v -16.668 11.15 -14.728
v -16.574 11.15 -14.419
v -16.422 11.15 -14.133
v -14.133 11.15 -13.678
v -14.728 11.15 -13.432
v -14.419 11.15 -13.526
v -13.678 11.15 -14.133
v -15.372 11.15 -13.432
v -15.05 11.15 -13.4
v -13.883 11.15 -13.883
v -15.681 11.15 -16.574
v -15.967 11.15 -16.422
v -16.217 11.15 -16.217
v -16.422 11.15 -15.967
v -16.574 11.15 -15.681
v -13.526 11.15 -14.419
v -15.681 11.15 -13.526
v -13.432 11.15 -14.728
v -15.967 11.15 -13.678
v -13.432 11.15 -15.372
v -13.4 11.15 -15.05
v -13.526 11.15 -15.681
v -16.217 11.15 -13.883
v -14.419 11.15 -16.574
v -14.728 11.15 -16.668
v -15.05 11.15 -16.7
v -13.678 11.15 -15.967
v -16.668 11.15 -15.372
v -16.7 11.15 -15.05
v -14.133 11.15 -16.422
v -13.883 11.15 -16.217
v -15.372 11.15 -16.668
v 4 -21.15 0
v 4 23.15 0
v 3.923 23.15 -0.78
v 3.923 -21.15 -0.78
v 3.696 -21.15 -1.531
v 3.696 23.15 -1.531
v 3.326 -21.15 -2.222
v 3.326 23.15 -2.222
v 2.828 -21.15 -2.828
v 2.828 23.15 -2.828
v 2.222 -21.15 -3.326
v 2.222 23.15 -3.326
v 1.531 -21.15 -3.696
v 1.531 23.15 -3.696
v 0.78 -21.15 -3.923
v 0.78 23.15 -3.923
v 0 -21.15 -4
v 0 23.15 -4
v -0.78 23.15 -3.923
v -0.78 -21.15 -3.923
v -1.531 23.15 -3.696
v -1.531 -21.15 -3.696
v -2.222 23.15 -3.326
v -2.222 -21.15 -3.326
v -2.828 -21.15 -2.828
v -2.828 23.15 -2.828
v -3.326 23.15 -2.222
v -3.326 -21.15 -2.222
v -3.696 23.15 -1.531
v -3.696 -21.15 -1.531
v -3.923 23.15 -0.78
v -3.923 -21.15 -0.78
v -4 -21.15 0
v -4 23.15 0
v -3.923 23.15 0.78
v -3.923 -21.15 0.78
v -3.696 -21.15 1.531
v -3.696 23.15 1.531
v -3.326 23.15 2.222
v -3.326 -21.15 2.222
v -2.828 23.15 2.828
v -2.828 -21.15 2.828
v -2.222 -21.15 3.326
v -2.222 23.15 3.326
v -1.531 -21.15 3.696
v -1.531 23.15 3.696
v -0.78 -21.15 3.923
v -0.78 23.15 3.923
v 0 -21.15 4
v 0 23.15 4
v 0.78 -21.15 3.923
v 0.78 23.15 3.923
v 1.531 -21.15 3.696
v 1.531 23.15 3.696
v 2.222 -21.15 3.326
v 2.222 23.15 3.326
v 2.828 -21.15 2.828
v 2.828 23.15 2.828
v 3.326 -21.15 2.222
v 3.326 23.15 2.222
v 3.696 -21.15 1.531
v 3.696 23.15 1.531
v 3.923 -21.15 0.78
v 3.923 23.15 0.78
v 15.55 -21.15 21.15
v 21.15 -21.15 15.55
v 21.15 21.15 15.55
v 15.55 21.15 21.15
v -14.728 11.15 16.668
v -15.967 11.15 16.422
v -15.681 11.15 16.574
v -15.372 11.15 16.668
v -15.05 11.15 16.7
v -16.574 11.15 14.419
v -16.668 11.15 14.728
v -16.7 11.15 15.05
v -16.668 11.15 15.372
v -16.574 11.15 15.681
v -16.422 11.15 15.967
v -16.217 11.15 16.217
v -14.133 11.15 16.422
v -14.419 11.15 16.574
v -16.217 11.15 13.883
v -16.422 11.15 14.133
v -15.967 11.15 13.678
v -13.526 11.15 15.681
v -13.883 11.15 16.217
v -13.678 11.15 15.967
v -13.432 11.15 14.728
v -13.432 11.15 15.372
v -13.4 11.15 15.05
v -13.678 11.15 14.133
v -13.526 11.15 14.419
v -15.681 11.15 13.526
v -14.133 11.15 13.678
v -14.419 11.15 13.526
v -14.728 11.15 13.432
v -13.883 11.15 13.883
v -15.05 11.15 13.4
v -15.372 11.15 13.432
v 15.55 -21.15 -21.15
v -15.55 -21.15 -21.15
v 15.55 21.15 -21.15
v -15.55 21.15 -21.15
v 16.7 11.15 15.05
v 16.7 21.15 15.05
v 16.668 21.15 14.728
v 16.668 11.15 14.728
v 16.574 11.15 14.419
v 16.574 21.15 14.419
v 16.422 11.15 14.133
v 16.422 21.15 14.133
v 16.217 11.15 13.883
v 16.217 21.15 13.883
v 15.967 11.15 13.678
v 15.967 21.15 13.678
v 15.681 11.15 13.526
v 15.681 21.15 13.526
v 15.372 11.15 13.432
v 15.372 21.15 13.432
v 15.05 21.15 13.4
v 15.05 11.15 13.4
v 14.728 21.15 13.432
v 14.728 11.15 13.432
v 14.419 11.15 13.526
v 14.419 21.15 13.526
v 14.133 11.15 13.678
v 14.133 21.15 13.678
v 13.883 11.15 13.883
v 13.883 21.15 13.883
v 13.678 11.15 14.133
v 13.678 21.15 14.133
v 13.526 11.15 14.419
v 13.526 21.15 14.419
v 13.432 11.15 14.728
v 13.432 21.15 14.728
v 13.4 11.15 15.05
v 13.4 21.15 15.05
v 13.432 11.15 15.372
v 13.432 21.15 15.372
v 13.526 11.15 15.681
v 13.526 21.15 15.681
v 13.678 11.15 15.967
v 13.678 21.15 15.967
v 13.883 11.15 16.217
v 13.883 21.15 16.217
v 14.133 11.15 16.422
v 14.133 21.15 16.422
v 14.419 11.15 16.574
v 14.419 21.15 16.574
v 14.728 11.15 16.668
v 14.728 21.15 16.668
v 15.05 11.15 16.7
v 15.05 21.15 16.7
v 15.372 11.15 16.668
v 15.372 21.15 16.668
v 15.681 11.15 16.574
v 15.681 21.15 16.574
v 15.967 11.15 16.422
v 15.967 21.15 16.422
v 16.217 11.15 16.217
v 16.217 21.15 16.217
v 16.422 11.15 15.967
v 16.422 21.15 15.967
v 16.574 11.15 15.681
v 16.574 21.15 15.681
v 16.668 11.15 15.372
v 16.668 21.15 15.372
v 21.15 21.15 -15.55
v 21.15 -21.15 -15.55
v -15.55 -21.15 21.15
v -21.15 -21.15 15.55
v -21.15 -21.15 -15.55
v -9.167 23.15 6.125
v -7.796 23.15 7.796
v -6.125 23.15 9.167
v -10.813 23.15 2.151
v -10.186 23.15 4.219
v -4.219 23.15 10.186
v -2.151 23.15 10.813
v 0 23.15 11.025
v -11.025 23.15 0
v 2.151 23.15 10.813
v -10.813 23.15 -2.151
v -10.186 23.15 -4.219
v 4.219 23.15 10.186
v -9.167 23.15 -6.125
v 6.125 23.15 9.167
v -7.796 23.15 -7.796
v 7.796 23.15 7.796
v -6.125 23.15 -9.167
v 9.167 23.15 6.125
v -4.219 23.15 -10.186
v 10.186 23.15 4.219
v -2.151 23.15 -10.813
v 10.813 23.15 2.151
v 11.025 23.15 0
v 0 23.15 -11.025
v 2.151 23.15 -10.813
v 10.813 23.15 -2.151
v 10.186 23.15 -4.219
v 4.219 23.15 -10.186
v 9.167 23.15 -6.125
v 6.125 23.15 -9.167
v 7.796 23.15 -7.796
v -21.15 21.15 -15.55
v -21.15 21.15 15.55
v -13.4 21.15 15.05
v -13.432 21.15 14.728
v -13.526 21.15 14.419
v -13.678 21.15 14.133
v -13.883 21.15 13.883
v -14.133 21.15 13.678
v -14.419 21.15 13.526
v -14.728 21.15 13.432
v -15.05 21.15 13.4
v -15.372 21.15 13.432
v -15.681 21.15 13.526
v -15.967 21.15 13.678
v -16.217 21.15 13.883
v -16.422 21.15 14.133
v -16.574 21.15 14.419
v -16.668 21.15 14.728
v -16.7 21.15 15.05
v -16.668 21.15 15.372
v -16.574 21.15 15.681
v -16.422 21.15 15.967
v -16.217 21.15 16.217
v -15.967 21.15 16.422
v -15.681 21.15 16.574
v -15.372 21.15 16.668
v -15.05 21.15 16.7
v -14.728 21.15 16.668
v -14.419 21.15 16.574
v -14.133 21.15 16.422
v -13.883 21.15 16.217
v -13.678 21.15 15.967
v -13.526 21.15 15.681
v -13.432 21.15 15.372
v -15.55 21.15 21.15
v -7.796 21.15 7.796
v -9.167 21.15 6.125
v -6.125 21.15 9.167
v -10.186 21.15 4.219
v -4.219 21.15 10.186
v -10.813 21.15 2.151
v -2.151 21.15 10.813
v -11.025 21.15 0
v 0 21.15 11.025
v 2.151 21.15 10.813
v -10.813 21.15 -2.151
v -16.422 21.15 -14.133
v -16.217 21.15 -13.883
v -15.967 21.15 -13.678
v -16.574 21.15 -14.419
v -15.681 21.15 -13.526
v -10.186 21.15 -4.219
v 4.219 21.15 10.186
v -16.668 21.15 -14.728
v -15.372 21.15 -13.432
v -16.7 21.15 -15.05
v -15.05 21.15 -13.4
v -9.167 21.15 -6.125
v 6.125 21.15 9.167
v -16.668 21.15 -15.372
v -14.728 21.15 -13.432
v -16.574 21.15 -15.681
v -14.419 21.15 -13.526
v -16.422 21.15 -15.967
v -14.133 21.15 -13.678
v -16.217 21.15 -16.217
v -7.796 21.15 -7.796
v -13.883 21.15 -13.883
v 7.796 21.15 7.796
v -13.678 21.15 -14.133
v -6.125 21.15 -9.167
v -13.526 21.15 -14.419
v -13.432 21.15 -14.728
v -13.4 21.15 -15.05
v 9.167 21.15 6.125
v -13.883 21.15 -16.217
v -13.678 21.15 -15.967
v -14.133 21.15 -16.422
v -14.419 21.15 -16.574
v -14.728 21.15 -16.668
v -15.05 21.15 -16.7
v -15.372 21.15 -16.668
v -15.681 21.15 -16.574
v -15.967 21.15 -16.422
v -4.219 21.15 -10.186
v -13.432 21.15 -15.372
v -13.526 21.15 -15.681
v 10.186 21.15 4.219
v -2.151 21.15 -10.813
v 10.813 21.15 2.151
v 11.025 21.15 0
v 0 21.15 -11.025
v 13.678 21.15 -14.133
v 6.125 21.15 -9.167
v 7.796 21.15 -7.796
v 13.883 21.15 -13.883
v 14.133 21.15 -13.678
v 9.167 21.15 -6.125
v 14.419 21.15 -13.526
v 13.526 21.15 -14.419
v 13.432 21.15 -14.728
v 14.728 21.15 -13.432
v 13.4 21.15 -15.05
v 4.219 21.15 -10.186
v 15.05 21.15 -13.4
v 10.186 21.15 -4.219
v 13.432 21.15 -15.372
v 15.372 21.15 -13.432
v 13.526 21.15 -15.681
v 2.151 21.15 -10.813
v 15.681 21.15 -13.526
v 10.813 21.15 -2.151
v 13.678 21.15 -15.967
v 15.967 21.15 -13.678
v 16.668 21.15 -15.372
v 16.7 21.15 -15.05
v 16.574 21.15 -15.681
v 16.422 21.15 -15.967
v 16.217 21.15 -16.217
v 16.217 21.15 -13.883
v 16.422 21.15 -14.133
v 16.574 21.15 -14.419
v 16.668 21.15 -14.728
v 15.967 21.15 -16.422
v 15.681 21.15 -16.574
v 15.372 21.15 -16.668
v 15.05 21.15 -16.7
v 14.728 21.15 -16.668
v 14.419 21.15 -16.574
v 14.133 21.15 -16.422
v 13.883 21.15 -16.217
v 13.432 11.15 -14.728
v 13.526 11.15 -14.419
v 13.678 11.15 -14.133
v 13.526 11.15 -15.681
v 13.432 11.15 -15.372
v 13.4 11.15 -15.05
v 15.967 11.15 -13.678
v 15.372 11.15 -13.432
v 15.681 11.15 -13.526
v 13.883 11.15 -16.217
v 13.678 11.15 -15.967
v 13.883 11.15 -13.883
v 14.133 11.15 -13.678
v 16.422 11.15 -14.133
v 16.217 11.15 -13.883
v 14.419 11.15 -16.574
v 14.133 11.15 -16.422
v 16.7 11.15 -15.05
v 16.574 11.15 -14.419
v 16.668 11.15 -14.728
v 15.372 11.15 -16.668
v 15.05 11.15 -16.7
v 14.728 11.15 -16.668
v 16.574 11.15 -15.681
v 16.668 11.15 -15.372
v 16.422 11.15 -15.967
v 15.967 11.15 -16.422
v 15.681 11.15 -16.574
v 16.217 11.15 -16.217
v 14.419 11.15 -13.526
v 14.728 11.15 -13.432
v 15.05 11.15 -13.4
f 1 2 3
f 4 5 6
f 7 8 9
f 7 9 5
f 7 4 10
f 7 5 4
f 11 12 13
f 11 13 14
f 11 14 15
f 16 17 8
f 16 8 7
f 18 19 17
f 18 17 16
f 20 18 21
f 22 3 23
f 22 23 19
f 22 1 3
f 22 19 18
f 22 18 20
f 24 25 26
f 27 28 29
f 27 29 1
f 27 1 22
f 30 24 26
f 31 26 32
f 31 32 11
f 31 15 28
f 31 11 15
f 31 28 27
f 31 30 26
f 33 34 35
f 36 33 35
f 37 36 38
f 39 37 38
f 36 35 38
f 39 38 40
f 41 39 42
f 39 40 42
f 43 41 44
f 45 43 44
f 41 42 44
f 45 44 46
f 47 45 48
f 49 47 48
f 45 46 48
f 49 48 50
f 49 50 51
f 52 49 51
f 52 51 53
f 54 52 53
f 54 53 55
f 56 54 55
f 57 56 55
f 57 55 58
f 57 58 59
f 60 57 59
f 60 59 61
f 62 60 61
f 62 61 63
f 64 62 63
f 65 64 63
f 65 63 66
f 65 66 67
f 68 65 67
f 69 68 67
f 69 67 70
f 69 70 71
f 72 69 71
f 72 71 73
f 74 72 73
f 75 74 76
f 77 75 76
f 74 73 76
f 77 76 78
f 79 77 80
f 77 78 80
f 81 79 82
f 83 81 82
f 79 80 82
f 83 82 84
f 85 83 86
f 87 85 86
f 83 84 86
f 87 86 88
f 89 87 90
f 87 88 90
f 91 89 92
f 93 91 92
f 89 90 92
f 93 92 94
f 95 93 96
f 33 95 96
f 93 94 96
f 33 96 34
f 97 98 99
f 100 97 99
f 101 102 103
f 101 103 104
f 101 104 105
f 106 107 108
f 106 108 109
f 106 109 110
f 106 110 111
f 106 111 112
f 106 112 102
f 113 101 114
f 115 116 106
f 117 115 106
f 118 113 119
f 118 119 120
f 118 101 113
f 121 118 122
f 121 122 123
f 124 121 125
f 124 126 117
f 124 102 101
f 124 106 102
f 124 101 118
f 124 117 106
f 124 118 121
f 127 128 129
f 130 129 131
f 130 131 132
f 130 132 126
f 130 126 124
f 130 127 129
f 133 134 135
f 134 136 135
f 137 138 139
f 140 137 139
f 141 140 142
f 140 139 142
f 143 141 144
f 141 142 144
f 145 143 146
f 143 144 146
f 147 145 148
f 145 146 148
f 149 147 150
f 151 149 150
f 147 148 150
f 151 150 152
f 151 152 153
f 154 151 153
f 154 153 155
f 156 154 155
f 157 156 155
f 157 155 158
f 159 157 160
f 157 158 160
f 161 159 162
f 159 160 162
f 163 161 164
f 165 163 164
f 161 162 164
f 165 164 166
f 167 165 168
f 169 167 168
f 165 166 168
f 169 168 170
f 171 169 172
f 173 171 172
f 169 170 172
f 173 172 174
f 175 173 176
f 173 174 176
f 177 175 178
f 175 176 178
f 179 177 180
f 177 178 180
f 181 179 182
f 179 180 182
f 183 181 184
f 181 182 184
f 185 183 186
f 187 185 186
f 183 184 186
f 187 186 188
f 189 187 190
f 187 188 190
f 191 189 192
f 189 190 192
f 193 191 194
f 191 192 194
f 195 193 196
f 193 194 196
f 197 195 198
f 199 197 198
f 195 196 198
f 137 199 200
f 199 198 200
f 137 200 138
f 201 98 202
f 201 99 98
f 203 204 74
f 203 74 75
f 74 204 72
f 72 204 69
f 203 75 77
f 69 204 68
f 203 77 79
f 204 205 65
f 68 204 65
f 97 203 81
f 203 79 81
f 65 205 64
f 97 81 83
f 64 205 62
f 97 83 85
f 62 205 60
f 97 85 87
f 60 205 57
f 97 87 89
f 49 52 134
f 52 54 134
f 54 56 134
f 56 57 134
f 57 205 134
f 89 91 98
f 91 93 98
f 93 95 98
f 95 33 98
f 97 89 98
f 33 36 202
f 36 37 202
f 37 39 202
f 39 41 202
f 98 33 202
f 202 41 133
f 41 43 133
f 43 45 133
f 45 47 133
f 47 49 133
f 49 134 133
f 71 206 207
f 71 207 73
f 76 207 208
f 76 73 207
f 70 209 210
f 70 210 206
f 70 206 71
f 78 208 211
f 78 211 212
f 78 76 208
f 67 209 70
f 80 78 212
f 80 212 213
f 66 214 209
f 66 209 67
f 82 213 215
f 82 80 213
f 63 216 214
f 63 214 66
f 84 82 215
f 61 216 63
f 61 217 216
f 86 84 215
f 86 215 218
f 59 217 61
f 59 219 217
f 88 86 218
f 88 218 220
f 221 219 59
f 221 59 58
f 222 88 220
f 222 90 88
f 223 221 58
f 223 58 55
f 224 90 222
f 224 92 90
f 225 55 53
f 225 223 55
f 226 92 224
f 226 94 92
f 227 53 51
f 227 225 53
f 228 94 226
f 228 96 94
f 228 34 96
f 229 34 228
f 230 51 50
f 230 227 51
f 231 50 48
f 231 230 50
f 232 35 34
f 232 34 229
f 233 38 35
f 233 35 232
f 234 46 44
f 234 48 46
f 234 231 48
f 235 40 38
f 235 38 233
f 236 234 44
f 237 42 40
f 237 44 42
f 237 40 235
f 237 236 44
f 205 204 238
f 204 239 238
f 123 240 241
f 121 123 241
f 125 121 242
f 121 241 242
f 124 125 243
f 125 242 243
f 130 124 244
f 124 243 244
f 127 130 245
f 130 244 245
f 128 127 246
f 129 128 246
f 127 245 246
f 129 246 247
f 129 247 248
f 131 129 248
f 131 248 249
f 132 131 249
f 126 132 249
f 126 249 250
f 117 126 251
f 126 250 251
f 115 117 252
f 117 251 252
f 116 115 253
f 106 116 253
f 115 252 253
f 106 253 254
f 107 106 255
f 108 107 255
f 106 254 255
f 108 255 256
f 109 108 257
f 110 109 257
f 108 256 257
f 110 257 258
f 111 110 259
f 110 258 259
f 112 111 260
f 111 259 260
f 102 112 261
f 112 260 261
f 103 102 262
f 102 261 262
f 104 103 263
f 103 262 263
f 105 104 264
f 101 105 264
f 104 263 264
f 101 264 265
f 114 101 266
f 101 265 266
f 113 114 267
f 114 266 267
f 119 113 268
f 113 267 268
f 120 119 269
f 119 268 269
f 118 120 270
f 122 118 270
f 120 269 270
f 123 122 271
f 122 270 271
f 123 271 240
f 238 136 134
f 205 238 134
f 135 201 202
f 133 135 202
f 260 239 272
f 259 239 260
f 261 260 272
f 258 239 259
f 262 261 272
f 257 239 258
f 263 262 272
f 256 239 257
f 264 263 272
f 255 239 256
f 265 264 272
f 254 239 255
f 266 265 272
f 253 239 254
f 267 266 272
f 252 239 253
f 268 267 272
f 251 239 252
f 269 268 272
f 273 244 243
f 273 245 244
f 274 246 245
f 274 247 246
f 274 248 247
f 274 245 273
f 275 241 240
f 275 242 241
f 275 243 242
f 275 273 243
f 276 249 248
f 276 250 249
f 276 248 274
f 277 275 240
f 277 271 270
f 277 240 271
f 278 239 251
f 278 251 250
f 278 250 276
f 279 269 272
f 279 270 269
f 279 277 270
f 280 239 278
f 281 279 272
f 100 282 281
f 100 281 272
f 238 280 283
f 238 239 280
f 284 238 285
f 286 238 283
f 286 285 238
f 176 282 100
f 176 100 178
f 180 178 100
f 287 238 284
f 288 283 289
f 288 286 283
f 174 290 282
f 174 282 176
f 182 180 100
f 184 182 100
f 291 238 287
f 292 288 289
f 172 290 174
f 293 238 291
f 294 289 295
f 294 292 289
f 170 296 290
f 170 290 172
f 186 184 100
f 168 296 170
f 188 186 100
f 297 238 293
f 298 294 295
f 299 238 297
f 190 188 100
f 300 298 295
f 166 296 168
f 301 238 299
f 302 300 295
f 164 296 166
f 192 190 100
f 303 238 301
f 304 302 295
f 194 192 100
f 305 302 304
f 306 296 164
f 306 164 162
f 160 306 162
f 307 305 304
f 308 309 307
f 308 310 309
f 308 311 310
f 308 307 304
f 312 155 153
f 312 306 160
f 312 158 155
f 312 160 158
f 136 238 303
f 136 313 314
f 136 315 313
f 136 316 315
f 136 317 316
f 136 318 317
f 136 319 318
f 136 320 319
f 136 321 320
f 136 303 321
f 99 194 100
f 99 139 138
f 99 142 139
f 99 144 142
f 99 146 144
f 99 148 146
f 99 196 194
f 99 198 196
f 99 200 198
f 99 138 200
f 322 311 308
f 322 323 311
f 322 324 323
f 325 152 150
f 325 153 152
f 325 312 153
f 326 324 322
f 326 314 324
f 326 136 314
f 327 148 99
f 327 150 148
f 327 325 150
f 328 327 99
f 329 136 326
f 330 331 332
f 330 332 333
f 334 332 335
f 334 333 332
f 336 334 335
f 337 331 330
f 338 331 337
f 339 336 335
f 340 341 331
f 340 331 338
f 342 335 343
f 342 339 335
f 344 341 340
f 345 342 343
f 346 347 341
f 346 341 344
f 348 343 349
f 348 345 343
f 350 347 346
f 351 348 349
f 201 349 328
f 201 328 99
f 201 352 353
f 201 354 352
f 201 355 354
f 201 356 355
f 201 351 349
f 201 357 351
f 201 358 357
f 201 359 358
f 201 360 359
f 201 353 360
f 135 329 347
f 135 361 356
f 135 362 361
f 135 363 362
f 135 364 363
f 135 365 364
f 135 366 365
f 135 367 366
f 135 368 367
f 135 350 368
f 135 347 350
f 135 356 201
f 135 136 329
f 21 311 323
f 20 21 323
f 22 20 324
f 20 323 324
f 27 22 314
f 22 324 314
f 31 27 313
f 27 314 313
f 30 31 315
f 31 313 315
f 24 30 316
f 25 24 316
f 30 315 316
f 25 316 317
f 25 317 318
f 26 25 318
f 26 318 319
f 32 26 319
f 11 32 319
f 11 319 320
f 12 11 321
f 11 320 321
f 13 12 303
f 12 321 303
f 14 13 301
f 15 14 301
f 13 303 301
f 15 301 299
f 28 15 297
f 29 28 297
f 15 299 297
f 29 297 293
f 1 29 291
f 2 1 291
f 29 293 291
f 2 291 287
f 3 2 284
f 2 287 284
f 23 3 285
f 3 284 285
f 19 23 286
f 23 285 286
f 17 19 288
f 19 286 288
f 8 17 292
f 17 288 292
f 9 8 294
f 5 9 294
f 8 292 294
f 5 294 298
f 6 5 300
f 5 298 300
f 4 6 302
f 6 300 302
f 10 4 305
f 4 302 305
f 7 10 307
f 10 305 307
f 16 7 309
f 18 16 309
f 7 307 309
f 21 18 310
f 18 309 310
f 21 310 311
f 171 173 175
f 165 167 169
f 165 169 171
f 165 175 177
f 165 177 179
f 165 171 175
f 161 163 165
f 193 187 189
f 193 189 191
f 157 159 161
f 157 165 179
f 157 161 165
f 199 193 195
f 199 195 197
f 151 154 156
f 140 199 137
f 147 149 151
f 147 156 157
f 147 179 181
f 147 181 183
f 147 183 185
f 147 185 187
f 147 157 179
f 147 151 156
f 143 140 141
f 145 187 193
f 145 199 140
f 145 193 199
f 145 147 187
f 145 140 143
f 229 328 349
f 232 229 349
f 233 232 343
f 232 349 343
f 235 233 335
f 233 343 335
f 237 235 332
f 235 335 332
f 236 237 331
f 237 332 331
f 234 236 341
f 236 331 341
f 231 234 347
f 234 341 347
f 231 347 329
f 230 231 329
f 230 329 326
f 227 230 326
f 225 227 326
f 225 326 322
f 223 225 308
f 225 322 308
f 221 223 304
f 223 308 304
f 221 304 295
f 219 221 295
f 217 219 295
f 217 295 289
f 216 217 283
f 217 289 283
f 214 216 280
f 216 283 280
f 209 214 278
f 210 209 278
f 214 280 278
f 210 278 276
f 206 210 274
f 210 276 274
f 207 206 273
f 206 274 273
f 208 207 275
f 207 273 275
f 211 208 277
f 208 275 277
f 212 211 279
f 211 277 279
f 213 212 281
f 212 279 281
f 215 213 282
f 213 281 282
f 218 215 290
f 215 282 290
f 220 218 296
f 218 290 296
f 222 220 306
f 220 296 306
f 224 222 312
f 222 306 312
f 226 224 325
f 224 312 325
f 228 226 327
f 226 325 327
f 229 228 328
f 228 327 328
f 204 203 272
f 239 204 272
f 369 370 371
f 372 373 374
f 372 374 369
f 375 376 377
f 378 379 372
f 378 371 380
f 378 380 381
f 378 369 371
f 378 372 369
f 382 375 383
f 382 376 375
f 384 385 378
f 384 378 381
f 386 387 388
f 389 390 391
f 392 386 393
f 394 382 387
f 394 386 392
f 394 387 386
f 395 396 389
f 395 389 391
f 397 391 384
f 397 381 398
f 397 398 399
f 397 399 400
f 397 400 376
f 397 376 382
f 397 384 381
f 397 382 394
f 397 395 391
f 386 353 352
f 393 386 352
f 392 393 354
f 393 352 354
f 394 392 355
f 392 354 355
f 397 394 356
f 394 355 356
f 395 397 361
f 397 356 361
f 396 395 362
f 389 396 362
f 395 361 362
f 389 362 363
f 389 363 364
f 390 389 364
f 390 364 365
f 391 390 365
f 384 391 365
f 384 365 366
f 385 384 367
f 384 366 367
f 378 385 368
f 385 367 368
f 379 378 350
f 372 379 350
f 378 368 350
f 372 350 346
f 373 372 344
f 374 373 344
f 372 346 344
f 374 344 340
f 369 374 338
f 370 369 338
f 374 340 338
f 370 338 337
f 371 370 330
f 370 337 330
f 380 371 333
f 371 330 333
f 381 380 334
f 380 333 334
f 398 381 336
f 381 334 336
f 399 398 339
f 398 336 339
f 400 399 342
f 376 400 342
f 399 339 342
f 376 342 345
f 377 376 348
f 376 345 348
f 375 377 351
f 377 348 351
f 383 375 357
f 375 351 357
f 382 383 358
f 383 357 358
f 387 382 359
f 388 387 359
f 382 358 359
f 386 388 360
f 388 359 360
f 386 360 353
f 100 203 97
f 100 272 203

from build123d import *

# Parameters (mm, degrees)
ESBO_O1_W                = 42.3
ESBO_O1_H                = 42.3
RESSALTO_EXTRUS_O1_DEPTH = 21.15
ESBO_O2_R                = 11.025
RESSALTO_EXTRUS_O2_DEPTH = 2
CHANFRO1_SIZE            = 5.6
ESBO_O4_R                = 1.65
CORTE_EXTRUS_O1_DEPTH    = 10
ESBO_O3_R                = 4
CORTE_EXTRUS_O2_DEPTH    = 70


with BuildPart() as part:
    # Esboço1 → Ressalto-extrusão1 (new body, symmetric)
    with BuildSketch(Plane(origin=(0, 0, 0), x_dir=(1, 0, 0), z_dir=(0, 1, 0))):
        Rectangle(ESBO_O1_W, ESBO_O1_H)
    extrude(amount=RESSALTO_EXTRUS_O1_DEPTH, both=True)

    # Esboço2 → Ressalto-extrusão2 (add)
    with BuildSketch(Plane(origin=(0, 21.15, 0), x_dir=(1, 0, 0), z_dir=(0, 1, 0))):
        Circle(ESBO_O2_R)
    extrude(amount=RESSALTO_EXTRUS_O2_DEPTH)

    # Chanfro1
    chanfro1_edges = [part.edges().sort_by_distance(p)[0] for p in [
        (21.15, 0, 21.15),
        (-21.15, 0, 21.15),
        (-21.15, 0, -21.15),
        (21.15, 0, -21.15),
    ]]
    chamfer(chanfro1_edges, length=CHANFRO1_SIZE)

    # Esboço4 → Corte-extrusão1 (cut)
    with BuildSketch(Plane(origin=(0, 21.15, 0), x_dir=(1, 0, 0), z_dir=(0, 1, 0))):
        with Locations((-15.05, 15.05)):
            Circle(ESBO_O4_R)
        with Locations((15.05, 15.05)):
            Circle(ESBO_O4_R)
        with Locations((15.05, -15.05)):
            Circle(ESBO_O4_R)
        with Locations((-15.05, -15.05)):
            Circle(ESBO_O4_R)
    extrude(amount=-CORTE_EXTRUS_O1_DEPTH, mode=Mode.SUBTRACT)

    # Esboço3 → Corte-extrusão2 (cut)
    with BuildSketch(Plane(origin=(0, 23.15, 0), x_dir=(1, 0, 0), z_dir=(0, 1, 0))):
        Circle(ESBO_O3_R)
    extrude(amount=-CORTE_EXTRUS_O2_DEPTH, mode=Mode.SUBTRACT)


solid = part.part
